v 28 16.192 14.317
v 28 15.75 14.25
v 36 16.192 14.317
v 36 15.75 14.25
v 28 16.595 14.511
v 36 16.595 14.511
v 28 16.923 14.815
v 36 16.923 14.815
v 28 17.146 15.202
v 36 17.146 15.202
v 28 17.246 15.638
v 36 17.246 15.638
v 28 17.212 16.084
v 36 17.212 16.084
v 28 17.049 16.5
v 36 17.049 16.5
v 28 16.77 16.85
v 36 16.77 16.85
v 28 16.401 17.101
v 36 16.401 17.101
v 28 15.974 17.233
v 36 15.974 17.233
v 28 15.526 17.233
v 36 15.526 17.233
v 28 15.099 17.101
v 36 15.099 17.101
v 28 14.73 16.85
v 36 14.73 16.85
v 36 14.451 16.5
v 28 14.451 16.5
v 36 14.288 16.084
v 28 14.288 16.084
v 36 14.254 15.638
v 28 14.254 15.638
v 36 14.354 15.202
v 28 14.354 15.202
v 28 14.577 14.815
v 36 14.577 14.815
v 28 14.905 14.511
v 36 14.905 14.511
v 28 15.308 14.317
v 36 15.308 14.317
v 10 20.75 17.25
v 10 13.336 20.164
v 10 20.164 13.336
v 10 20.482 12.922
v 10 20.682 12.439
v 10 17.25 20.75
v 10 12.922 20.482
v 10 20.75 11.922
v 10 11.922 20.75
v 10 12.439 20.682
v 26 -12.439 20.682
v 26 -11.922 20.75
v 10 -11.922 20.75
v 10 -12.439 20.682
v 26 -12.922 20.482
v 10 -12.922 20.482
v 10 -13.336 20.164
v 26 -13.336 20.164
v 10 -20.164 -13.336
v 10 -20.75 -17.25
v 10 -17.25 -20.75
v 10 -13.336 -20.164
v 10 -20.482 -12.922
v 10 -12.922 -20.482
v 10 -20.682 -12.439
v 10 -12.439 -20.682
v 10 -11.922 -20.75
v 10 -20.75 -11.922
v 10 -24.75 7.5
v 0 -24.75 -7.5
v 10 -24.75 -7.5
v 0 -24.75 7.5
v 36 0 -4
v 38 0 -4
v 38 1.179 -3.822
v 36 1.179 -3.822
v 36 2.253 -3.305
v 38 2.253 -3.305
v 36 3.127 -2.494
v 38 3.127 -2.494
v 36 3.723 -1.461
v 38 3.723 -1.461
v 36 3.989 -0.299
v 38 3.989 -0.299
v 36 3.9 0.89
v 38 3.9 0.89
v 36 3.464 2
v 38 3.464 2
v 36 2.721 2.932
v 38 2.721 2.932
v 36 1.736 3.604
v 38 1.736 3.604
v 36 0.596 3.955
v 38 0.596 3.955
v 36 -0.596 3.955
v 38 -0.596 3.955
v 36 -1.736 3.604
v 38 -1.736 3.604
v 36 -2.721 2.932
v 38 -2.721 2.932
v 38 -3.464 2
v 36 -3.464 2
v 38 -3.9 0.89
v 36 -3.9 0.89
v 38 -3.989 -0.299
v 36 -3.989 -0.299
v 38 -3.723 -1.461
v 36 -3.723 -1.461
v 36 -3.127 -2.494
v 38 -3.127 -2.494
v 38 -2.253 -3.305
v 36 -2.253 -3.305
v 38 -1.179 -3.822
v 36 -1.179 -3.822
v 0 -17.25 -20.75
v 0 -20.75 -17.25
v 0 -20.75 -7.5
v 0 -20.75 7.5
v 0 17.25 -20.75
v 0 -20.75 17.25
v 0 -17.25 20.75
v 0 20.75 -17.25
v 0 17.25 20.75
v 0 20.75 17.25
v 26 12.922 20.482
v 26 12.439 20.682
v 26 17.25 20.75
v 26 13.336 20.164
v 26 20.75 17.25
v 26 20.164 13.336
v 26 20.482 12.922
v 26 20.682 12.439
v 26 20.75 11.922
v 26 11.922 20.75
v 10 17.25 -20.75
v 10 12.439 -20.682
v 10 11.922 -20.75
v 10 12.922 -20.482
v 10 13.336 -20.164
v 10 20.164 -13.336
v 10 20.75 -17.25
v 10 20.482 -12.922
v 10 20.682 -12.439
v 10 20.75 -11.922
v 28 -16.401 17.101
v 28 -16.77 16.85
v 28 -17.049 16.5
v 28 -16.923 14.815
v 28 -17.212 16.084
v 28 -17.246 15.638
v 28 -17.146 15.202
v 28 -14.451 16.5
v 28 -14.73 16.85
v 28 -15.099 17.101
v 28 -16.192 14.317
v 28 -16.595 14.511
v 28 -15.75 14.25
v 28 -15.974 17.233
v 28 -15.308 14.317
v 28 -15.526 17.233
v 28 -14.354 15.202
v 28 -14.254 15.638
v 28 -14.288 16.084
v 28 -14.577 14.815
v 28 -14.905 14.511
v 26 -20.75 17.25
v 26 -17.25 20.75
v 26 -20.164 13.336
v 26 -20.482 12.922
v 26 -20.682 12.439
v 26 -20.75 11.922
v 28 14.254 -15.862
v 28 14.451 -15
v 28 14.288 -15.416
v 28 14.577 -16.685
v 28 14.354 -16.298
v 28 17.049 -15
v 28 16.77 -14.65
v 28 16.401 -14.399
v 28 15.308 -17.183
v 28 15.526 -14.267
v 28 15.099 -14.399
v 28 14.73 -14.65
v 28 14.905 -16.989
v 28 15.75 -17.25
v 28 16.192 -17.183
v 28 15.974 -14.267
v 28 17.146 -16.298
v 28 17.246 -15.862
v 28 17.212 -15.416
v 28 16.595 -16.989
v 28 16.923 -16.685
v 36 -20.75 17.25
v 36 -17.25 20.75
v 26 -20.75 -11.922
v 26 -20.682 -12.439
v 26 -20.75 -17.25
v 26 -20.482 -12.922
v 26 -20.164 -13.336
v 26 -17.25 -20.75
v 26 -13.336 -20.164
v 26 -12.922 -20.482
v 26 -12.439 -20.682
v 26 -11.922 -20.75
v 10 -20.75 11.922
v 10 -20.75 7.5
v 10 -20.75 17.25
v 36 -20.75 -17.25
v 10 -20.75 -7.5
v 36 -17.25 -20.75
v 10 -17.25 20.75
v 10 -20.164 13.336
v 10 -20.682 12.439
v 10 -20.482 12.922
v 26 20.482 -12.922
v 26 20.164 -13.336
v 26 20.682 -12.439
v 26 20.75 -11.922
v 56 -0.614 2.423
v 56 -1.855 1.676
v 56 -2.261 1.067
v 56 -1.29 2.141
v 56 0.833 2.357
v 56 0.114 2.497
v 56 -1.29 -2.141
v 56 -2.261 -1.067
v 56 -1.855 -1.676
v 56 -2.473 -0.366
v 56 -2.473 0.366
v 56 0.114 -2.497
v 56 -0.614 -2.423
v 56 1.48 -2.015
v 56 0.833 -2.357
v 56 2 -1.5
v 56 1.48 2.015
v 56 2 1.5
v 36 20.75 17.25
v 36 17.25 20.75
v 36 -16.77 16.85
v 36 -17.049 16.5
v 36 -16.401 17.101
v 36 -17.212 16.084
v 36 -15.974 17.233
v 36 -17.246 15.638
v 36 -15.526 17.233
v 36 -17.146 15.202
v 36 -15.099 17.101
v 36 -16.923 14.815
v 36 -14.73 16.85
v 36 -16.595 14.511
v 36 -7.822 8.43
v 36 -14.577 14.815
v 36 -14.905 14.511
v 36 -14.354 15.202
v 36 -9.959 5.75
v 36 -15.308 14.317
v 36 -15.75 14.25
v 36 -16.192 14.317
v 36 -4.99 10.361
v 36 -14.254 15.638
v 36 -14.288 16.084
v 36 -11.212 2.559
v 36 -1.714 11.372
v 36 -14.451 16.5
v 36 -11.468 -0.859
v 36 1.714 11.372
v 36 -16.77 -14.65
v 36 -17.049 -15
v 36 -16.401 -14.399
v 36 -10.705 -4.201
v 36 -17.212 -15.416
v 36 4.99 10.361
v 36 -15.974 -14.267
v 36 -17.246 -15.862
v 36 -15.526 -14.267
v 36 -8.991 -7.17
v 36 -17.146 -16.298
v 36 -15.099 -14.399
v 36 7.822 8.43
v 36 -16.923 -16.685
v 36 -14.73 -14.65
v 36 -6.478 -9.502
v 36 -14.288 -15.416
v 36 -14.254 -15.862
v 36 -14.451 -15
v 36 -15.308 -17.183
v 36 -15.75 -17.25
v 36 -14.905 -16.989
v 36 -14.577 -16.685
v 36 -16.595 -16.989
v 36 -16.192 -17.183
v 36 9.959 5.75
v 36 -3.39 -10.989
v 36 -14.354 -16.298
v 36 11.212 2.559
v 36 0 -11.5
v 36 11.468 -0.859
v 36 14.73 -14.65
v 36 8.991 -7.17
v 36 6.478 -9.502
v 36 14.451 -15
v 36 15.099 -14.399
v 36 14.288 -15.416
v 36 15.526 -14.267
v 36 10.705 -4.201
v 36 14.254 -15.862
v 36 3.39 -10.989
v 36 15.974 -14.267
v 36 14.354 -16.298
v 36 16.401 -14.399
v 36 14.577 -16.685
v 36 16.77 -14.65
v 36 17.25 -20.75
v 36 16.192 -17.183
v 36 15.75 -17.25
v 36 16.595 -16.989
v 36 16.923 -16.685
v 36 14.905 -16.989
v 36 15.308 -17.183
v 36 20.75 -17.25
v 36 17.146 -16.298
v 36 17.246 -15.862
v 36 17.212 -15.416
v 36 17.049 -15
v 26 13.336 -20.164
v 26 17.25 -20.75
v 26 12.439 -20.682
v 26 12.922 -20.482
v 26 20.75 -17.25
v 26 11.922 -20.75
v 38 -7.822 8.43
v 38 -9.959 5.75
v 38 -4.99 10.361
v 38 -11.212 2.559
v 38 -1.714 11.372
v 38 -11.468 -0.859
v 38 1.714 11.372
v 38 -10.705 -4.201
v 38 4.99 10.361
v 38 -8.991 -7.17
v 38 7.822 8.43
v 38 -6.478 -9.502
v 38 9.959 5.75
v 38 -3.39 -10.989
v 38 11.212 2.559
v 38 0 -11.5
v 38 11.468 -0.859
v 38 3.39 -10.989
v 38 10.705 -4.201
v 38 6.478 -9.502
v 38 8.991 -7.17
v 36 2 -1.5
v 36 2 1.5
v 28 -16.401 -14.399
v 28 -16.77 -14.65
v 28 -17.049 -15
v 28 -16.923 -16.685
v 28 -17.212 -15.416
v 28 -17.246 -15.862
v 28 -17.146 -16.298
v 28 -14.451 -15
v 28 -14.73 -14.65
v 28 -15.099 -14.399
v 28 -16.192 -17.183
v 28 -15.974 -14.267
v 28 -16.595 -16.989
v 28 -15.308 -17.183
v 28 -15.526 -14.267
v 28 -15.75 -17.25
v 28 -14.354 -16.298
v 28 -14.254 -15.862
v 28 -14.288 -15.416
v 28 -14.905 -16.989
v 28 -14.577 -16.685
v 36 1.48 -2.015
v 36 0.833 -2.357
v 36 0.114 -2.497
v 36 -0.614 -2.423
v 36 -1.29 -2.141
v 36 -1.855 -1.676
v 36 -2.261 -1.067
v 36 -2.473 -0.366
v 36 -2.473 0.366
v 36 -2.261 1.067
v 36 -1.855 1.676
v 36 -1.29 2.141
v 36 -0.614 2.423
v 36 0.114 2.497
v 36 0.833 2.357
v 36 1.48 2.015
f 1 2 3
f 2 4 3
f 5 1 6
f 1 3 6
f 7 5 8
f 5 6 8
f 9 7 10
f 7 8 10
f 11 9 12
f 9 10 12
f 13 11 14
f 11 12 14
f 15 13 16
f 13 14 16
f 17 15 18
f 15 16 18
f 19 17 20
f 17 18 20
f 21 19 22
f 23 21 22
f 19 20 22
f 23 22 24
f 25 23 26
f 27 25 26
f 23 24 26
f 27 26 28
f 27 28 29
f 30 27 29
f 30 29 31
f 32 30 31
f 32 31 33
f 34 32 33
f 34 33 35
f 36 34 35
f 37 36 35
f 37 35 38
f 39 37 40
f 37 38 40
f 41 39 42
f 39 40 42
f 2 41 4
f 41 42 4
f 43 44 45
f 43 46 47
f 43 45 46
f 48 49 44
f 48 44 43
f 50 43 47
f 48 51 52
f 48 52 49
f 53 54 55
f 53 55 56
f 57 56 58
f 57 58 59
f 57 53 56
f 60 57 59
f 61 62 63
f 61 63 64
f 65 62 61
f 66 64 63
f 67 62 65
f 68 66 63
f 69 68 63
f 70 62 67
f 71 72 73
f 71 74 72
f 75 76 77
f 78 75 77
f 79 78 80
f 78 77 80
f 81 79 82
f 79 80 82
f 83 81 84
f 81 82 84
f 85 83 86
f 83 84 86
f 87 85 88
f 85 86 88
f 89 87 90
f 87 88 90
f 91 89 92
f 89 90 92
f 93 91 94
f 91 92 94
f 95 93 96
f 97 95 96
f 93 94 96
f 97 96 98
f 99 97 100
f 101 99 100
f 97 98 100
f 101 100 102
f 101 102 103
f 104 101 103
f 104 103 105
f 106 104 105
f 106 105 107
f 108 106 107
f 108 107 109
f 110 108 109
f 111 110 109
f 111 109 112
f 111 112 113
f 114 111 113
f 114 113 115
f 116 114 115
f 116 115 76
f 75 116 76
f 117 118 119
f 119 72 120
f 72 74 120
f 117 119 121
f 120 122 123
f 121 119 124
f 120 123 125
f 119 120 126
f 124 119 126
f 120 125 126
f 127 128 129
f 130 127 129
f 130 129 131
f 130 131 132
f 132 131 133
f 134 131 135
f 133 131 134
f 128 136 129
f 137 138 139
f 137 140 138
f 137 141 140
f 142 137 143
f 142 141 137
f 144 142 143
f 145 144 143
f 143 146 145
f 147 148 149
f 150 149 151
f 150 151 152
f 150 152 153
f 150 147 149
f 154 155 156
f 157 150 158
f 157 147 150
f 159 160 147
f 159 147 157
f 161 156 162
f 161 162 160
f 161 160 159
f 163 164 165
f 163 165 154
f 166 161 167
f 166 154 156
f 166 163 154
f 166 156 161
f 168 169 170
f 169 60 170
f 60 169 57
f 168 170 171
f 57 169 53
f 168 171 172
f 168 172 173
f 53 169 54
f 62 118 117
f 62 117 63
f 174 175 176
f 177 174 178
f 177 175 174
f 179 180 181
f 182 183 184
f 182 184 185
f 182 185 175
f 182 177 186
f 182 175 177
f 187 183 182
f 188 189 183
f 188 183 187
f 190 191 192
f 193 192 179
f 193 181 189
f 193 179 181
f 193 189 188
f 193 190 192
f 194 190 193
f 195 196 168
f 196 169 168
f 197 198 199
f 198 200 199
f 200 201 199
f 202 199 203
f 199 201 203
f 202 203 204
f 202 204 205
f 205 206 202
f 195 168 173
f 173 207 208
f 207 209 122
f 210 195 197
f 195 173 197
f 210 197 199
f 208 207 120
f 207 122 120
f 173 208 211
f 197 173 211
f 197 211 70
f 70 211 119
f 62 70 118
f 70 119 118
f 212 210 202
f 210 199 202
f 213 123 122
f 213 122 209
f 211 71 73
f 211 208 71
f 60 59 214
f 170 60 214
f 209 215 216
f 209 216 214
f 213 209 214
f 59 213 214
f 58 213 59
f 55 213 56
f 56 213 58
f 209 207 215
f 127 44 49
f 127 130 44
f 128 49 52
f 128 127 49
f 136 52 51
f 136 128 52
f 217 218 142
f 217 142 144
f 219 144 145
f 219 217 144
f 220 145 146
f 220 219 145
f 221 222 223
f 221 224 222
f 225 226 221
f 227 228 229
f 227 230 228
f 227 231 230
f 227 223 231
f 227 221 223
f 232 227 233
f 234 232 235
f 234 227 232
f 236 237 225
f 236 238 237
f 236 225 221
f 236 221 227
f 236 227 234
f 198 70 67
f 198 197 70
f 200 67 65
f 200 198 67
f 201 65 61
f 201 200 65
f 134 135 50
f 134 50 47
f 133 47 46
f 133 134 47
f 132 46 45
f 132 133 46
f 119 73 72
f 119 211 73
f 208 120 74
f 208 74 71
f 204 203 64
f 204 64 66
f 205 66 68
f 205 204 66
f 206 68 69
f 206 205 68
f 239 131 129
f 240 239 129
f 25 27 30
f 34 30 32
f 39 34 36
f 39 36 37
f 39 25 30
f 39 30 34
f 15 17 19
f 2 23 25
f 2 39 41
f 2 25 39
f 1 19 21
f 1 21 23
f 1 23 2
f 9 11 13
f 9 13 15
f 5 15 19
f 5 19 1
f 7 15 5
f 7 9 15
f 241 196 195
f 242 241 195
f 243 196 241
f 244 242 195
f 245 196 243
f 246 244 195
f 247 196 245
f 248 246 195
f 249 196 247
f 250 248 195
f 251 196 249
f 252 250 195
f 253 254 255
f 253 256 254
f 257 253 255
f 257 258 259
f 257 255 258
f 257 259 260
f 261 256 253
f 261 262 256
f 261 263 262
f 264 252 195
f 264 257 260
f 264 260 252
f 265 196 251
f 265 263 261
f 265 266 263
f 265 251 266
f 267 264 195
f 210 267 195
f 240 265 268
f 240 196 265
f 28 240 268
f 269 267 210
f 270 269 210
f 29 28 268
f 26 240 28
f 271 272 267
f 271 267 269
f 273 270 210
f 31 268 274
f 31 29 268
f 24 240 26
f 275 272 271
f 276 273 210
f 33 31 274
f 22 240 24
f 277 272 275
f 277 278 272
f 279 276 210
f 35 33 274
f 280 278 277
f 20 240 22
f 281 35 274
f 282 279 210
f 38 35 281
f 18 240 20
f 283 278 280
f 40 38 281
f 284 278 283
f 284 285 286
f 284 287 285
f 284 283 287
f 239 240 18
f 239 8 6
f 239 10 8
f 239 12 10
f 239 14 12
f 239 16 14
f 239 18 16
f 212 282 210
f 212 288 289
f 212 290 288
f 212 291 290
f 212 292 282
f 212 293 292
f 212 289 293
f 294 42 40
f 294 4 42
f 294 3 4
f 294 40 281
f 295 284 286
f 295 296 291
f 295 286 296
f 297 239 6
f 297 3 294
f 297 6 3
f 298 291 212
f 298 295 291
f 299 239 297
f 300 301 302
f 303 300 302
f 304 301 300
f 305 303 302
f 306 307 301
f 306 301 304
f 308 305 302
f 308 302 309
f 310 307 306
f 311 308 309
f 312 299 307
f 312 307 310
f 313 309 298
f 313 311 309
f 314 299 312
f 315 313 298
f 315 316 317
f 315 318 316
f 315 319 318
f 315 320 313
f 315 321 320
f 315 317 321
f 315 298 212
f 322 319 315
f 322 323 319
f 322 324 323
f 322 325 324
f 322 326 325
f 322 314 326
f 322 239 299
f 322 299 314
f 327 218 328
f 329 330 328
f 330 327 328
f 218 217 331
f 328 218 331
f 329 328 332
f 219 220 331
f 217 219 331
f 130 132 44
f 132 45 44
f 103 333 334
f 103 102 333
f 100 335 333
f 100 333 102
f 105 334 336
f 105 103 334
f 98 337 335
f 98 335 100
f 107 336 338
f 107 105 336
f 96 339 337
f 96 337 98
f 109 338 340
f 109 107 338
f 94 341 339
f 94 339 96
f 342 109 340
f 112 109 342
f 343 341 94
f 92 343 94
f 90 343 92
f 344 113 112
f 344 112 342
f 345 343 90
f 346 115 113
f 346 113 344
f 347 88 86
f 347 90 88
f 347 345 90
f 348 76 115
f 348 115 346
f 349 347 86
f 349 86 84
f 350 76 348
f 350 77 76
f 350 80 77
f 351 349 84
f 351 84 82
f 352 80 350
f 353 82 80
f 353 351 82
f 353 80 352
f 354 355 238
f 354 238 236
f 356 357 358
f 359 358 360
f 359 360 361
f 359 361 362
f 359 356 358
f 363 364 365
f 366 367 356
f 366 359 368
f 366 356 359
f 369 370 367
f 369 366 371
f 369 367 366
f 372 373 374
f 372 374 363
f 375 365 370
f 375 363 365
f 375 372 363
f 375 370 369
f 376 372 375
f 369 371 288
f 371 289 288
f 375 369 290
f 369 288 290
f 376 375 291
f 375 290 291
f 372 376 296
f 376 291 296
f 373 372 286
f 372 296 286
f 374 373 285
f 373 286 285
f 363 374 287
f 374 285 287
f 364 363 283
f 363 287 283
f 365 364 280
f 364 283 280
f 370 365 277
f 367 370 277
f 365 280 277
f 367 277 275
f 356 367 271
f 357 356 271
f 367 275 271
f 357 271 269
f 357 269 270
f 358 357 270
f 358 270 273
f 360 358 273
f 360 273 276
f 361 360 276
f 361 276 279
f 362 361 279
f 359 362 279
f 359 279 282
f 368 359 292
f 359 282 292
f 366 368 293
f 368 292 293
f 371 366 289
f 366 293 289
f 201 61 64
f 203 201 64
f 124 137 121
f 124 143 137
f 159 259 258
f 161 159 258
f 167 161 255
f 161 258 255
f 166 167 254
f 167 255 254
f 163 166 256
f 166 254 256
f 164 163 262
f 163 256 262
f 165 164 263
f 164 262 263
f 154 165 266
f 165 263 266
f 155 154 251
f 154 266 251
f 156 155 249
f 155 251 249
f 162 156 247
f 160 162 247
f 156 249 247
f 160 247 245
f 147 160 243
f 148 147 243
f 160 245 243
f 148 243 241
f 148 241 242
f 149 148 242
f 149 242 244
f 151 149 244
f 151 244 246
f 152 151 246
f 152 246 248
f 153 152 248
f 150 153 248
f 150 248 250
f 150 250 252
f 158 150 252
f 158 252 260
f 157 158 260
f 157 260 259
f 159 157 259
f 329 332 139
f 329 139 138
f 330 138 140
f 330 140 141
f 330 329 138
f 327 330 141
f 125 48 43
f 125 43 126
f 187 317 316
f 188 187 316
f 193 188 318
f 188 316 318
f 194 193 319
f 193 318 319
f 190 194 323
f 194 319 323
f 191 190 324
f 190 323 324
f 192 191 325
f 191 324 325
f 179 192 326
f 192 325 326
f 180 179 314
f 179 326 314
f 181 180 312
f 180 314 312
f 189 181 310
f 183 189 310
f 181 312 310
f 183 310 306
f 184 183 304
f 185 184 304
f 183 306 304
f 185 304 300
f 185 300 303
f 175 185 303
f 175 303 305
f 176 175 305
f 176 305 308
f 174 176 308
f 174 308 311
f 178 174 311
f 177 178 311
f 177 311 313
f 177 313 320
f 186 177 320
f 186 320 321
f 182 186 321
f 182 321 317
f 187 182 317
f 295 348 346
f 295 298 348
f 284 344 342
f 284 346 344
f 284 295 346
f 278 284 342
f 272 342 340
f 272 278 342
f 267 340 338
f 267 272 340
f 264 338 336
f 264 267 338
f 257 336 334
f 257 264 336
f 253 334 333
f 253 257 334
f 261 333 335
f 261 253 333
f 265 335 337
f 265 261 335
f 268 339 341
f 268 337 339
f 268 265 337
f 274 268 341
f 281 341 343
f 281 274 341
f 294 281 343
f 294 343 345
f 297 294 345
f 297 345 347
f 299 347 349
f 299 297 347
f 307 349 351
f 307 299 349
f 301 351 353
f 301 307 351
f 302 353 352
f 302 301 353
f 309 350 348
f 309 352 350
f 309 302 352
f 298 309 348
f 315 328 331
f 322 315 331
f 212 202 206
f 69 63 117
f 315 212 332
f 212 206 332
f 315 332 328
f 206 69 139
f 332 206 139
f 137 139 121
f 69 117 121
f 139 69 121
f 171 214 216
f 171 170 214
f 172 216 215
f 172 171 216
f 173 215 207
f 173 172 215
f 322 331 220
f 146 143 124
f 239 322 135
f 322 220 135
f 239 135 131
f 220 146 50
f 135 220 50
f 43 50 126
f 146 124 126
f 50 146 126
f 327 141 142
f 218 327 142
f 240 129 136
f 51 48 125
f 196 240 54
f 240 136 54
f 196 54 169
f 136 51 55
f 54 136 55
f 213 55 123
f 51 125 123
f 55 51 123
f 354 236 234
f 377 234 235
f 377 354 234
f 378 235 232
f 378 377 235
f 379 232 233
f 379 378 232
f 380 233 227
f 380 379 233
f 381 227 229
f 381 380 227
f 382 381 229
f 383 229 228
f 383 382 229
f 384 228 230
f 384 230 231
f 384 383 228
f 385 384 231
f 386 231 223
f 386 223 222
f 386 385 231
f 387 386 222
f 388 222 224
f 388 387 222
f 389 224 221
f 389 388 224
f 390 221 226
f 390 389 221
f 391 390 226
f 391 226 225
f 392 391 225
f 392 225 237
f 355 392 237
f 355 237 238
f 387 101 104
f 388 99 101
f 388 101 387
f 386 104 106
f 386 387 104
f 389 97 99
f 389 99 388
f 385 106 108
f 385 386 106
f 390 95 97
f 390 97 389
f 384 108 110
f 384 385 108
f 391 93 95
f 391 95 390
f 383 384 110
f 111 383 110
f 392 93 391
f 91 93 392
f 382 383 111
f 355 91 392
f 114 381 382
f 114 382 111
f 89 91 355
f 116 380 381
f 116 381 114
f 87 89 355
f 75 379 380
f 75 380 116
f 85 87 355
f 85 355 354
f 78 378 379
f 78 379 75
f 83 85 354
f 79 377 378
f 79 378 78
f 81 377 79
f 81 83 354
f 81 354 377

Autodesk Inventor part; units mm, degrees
ref_plane "YZ Plane" through (0, 0, 0) normal (1, 0, 0) x (0, 1, 0)
ref_plane "XZ Plane" through (0, 0, 0) normal (0, 1, 0) x (-1, 0, 0)
ref_plane "XY Plane" through (0, 0, 0) normal (0, 0, 1) x (1, 0, 0)
sketch "Skizze2" plane through (0, 0, 0) normal (1, 0, 0) x (0, 1, 0)
  line L0 (20.75, -20.75) -> (-20.75, -20.75)
  line L1 (-20.75, -20.75) -> (-20.75, 20.75)
  line L2 (-20.75, 20.75) -> (20.75, 20.75)
  line L3 (20.75, 20.75) -> (20.75, -20.75)
  line L4 (-29.05, 0) -> (29.05, 0) projected
  line L5 (0, -29.05) -> (0, 29.05) projected
  point P0 (0, 0)
  dimension "d0" = 41.5
  dimension "d1" = 41.5
extrude "Extrusion1" add sketch "Skizze2" along normal blind 10
chamfer "Fase1" distance 3.5 angle 45 4 edges at (5, 20.75, 20.75) (5, 20.75, -20.75) (5, -20.75, -20.75) (5, -20.75, 20.75)
sketch "Skizze5" plane through (10, 0, 0) normal (1, 0, 0) x (0, 0, -1)
  line L0 (20.75, 20.75) -> (-20.75, 20.75)
  line L1 (-20.75, 20.75) -> (-20.75, -20.75)
  line L2 (-20.75, -20.75) -> (20.75, -20.75)
  line L3 (20.75, -20.75) -> (20.75, 20.75)
  line L4 (0, -29.064) -> (0, 29.1338) projected
  line L5 (17.25, 20.75) -> (-17.25, 20.75) projected
  line L6 (29.05, 0) -> (-29.05, 0) projected
  line L7 (20.75, -17.25) -> (20.75, 17.25) projected
  line L8 (20.75, 12.75) -> (12.75, 20.75)
  line L9 (17.25, 20.75) -> (20.75, 17.25) projected
  line L10 (-12.75, 20.75) -> (-20.75, 12.75)
  line L11 (-20.75, -12.75) -> (-12.75, -20.75)
  line L12 (12.75, -20.75) -> (20.75, -12.75)
  point P0 (0, 0)
  dimension "d11" = 41.5
  dimension "d12" = 41.5
  dimension "d20" = 8
  dimension "d21" = 8
  dimension "d24" = 360
extrude "Extrusion5" add sketch "Skizze5" along normal blind 16 contours L8 L3 L6 L4 L0 | L4 L6 L1 L10 L0 | L3 L12 L2 L4 L6 | L4 L2 L11 L1 L6
sketch "Skizze6" plane through (26, 0, 0) normal (1, 0, 0) x (0, 0, -1)
  line L0 (20.75, 20.75) -> (-20.75, 20.75)
  line L1 (-20.75, 20.75) -> (-20.75, -20.75)
  line L2 (-20.75, -20.75) -> (20.75, -20.75)
  line L3 (20.75, -20.75) -> (20.75, 20.75)
  line L4 (29.05, 0) -> (-29.05, 0) projected
  line L5 (0, -29.05) -> (0, 29.05) projected
  line L6 (20.75, 12.75) -> (20.75, 17.25) projected
  line L7 (20.75, 17.25) -> (17.25, 20.75)
  line L8 (-17.25, 20.75) -> (-20.75, 17.25)
  line L9 (-20.75, -17.25) -> (-17.25, -20.75)
  line L10 (17.25, -20.75) -> (20.75, -17.25)
  point P0 (0, 0)
  dimension "d28" = 41.5
  dimension "d29" = 41.5
  dimension "d32" = 360
extrude "Extrusion6" add sketch "Skizze6" along normal blind 10 contours L7 L3 L4 L5 L0 | L5 L4 L1 L8 L0 | L5 L2 L9 L1 L4 | L4 L3 L10 L2 L5
fillet "Rundung1" radius 2 8 edges at (18, 12.75, -20.75) (18, 20.75, -12.75) (18, -12.75, -20.75) (18, -20.75, -12.75) (18, -20.75, 12.75) (18, -12.75, 20.75) (18, 12.75, 20.75) (18, 20.75, 12.75)
sketch "Skizze7" plane through (36, 0, 0) normal (1, 0, 0) x (0, 0, -1)
  circle A0 centre (0, 0) radius 11.5
  circle A1 centre (15.75, -15.75) radius 1.5
  circle A2 centre (15.75, 15.75) radius 1.5
  circle A3 centre (-15.75, -15.75) radius 1.5
  circle A4 centre (-15.75, 15.75) radius 1.5
  dimension "d37" = 23
  dimension "d61" = 3
  dimension "d62" = 3
  dimension "d67" = 15.75
  dimension "d68" = 15.75
  dimension "d69" = 3
  dimension "d70" = 3
  dimension "d71" = 15.75
  dimension "d72" = 15.75
extrude "Extrusion7" add sketch "Skizze7" along normal blind 2 contours A0
sketch "Skizze8" plane through (38, 0, 0) normal (1, 0, 0) x (0, 0, -1)
  circle A0 centre (0, 0) radius 4
  dimension "d40" = 8
extrude "Extrusion8" cut sketch "Skizze8" against normal blind 2
sketch "Skizze9" plane through (36, 0, 0) normal (1, 0, 0) x (0, 0, -1)
  circle A0 centre (0, 0) radius 2.5
  line L0 (2.5, 0) -> (-2.5, 0)
  line L1 (-2.5, 0) -> (-2.5, 2.5)
  line L2 (-2.5, 2.5) -> (2.5, 2.5)
  line L3 (2.5, 2.5) -> (2.5, 0)
  line L4 (2.5, 2.5) -> (-2.5, 2.5)
  line L5 (-2.5, 2.5) -> (-2.5, 2)
  line L6 (-2.5, 2) -> (2.5, 2)
  line L7 (2.5, 2) -> (2.5, 2.5)
  point P0 (1.5, 2)
  point P1 (-1.5, 2)
  dimension "d43" = 5
  dimension "d44" = 0.5
  dimension "d47" = 2
extrude "Extrusion9" add sketch "Skizze9" along normal blind 20 contours L0 A0 | A0 L6 L0
sketch "Skizze10" plane through (0, -20.75, -17.25) normal (0, -1, 0) x (1, 0, 0)
  line L0 (0, 0) -> (0, 34.5) projected
  line L1 (0, 24.75) -> (10, 24.75)
  line L2 (10, 24.75) -> (10, 9.75)
  line L3 (10, 9.75) -> (0, 9.75)
  line L4 (0, 9.75) -> (0, 24.75)
  line L5 (0, 17.25) -> (36, 17.25)
  line L6 (36, 34.5) -> (36, 0) projected
  dimension "d48" = 10
  dimension "d49" = 15
extrude "Extrusion10" add sketch "Skizze10" along normal blind 4
extrude "Extrusion11" cut sketch "Skizze7" against normal blind 8 contours A1 | A2 | A3 | A4
properties part number "Steppermotor"
